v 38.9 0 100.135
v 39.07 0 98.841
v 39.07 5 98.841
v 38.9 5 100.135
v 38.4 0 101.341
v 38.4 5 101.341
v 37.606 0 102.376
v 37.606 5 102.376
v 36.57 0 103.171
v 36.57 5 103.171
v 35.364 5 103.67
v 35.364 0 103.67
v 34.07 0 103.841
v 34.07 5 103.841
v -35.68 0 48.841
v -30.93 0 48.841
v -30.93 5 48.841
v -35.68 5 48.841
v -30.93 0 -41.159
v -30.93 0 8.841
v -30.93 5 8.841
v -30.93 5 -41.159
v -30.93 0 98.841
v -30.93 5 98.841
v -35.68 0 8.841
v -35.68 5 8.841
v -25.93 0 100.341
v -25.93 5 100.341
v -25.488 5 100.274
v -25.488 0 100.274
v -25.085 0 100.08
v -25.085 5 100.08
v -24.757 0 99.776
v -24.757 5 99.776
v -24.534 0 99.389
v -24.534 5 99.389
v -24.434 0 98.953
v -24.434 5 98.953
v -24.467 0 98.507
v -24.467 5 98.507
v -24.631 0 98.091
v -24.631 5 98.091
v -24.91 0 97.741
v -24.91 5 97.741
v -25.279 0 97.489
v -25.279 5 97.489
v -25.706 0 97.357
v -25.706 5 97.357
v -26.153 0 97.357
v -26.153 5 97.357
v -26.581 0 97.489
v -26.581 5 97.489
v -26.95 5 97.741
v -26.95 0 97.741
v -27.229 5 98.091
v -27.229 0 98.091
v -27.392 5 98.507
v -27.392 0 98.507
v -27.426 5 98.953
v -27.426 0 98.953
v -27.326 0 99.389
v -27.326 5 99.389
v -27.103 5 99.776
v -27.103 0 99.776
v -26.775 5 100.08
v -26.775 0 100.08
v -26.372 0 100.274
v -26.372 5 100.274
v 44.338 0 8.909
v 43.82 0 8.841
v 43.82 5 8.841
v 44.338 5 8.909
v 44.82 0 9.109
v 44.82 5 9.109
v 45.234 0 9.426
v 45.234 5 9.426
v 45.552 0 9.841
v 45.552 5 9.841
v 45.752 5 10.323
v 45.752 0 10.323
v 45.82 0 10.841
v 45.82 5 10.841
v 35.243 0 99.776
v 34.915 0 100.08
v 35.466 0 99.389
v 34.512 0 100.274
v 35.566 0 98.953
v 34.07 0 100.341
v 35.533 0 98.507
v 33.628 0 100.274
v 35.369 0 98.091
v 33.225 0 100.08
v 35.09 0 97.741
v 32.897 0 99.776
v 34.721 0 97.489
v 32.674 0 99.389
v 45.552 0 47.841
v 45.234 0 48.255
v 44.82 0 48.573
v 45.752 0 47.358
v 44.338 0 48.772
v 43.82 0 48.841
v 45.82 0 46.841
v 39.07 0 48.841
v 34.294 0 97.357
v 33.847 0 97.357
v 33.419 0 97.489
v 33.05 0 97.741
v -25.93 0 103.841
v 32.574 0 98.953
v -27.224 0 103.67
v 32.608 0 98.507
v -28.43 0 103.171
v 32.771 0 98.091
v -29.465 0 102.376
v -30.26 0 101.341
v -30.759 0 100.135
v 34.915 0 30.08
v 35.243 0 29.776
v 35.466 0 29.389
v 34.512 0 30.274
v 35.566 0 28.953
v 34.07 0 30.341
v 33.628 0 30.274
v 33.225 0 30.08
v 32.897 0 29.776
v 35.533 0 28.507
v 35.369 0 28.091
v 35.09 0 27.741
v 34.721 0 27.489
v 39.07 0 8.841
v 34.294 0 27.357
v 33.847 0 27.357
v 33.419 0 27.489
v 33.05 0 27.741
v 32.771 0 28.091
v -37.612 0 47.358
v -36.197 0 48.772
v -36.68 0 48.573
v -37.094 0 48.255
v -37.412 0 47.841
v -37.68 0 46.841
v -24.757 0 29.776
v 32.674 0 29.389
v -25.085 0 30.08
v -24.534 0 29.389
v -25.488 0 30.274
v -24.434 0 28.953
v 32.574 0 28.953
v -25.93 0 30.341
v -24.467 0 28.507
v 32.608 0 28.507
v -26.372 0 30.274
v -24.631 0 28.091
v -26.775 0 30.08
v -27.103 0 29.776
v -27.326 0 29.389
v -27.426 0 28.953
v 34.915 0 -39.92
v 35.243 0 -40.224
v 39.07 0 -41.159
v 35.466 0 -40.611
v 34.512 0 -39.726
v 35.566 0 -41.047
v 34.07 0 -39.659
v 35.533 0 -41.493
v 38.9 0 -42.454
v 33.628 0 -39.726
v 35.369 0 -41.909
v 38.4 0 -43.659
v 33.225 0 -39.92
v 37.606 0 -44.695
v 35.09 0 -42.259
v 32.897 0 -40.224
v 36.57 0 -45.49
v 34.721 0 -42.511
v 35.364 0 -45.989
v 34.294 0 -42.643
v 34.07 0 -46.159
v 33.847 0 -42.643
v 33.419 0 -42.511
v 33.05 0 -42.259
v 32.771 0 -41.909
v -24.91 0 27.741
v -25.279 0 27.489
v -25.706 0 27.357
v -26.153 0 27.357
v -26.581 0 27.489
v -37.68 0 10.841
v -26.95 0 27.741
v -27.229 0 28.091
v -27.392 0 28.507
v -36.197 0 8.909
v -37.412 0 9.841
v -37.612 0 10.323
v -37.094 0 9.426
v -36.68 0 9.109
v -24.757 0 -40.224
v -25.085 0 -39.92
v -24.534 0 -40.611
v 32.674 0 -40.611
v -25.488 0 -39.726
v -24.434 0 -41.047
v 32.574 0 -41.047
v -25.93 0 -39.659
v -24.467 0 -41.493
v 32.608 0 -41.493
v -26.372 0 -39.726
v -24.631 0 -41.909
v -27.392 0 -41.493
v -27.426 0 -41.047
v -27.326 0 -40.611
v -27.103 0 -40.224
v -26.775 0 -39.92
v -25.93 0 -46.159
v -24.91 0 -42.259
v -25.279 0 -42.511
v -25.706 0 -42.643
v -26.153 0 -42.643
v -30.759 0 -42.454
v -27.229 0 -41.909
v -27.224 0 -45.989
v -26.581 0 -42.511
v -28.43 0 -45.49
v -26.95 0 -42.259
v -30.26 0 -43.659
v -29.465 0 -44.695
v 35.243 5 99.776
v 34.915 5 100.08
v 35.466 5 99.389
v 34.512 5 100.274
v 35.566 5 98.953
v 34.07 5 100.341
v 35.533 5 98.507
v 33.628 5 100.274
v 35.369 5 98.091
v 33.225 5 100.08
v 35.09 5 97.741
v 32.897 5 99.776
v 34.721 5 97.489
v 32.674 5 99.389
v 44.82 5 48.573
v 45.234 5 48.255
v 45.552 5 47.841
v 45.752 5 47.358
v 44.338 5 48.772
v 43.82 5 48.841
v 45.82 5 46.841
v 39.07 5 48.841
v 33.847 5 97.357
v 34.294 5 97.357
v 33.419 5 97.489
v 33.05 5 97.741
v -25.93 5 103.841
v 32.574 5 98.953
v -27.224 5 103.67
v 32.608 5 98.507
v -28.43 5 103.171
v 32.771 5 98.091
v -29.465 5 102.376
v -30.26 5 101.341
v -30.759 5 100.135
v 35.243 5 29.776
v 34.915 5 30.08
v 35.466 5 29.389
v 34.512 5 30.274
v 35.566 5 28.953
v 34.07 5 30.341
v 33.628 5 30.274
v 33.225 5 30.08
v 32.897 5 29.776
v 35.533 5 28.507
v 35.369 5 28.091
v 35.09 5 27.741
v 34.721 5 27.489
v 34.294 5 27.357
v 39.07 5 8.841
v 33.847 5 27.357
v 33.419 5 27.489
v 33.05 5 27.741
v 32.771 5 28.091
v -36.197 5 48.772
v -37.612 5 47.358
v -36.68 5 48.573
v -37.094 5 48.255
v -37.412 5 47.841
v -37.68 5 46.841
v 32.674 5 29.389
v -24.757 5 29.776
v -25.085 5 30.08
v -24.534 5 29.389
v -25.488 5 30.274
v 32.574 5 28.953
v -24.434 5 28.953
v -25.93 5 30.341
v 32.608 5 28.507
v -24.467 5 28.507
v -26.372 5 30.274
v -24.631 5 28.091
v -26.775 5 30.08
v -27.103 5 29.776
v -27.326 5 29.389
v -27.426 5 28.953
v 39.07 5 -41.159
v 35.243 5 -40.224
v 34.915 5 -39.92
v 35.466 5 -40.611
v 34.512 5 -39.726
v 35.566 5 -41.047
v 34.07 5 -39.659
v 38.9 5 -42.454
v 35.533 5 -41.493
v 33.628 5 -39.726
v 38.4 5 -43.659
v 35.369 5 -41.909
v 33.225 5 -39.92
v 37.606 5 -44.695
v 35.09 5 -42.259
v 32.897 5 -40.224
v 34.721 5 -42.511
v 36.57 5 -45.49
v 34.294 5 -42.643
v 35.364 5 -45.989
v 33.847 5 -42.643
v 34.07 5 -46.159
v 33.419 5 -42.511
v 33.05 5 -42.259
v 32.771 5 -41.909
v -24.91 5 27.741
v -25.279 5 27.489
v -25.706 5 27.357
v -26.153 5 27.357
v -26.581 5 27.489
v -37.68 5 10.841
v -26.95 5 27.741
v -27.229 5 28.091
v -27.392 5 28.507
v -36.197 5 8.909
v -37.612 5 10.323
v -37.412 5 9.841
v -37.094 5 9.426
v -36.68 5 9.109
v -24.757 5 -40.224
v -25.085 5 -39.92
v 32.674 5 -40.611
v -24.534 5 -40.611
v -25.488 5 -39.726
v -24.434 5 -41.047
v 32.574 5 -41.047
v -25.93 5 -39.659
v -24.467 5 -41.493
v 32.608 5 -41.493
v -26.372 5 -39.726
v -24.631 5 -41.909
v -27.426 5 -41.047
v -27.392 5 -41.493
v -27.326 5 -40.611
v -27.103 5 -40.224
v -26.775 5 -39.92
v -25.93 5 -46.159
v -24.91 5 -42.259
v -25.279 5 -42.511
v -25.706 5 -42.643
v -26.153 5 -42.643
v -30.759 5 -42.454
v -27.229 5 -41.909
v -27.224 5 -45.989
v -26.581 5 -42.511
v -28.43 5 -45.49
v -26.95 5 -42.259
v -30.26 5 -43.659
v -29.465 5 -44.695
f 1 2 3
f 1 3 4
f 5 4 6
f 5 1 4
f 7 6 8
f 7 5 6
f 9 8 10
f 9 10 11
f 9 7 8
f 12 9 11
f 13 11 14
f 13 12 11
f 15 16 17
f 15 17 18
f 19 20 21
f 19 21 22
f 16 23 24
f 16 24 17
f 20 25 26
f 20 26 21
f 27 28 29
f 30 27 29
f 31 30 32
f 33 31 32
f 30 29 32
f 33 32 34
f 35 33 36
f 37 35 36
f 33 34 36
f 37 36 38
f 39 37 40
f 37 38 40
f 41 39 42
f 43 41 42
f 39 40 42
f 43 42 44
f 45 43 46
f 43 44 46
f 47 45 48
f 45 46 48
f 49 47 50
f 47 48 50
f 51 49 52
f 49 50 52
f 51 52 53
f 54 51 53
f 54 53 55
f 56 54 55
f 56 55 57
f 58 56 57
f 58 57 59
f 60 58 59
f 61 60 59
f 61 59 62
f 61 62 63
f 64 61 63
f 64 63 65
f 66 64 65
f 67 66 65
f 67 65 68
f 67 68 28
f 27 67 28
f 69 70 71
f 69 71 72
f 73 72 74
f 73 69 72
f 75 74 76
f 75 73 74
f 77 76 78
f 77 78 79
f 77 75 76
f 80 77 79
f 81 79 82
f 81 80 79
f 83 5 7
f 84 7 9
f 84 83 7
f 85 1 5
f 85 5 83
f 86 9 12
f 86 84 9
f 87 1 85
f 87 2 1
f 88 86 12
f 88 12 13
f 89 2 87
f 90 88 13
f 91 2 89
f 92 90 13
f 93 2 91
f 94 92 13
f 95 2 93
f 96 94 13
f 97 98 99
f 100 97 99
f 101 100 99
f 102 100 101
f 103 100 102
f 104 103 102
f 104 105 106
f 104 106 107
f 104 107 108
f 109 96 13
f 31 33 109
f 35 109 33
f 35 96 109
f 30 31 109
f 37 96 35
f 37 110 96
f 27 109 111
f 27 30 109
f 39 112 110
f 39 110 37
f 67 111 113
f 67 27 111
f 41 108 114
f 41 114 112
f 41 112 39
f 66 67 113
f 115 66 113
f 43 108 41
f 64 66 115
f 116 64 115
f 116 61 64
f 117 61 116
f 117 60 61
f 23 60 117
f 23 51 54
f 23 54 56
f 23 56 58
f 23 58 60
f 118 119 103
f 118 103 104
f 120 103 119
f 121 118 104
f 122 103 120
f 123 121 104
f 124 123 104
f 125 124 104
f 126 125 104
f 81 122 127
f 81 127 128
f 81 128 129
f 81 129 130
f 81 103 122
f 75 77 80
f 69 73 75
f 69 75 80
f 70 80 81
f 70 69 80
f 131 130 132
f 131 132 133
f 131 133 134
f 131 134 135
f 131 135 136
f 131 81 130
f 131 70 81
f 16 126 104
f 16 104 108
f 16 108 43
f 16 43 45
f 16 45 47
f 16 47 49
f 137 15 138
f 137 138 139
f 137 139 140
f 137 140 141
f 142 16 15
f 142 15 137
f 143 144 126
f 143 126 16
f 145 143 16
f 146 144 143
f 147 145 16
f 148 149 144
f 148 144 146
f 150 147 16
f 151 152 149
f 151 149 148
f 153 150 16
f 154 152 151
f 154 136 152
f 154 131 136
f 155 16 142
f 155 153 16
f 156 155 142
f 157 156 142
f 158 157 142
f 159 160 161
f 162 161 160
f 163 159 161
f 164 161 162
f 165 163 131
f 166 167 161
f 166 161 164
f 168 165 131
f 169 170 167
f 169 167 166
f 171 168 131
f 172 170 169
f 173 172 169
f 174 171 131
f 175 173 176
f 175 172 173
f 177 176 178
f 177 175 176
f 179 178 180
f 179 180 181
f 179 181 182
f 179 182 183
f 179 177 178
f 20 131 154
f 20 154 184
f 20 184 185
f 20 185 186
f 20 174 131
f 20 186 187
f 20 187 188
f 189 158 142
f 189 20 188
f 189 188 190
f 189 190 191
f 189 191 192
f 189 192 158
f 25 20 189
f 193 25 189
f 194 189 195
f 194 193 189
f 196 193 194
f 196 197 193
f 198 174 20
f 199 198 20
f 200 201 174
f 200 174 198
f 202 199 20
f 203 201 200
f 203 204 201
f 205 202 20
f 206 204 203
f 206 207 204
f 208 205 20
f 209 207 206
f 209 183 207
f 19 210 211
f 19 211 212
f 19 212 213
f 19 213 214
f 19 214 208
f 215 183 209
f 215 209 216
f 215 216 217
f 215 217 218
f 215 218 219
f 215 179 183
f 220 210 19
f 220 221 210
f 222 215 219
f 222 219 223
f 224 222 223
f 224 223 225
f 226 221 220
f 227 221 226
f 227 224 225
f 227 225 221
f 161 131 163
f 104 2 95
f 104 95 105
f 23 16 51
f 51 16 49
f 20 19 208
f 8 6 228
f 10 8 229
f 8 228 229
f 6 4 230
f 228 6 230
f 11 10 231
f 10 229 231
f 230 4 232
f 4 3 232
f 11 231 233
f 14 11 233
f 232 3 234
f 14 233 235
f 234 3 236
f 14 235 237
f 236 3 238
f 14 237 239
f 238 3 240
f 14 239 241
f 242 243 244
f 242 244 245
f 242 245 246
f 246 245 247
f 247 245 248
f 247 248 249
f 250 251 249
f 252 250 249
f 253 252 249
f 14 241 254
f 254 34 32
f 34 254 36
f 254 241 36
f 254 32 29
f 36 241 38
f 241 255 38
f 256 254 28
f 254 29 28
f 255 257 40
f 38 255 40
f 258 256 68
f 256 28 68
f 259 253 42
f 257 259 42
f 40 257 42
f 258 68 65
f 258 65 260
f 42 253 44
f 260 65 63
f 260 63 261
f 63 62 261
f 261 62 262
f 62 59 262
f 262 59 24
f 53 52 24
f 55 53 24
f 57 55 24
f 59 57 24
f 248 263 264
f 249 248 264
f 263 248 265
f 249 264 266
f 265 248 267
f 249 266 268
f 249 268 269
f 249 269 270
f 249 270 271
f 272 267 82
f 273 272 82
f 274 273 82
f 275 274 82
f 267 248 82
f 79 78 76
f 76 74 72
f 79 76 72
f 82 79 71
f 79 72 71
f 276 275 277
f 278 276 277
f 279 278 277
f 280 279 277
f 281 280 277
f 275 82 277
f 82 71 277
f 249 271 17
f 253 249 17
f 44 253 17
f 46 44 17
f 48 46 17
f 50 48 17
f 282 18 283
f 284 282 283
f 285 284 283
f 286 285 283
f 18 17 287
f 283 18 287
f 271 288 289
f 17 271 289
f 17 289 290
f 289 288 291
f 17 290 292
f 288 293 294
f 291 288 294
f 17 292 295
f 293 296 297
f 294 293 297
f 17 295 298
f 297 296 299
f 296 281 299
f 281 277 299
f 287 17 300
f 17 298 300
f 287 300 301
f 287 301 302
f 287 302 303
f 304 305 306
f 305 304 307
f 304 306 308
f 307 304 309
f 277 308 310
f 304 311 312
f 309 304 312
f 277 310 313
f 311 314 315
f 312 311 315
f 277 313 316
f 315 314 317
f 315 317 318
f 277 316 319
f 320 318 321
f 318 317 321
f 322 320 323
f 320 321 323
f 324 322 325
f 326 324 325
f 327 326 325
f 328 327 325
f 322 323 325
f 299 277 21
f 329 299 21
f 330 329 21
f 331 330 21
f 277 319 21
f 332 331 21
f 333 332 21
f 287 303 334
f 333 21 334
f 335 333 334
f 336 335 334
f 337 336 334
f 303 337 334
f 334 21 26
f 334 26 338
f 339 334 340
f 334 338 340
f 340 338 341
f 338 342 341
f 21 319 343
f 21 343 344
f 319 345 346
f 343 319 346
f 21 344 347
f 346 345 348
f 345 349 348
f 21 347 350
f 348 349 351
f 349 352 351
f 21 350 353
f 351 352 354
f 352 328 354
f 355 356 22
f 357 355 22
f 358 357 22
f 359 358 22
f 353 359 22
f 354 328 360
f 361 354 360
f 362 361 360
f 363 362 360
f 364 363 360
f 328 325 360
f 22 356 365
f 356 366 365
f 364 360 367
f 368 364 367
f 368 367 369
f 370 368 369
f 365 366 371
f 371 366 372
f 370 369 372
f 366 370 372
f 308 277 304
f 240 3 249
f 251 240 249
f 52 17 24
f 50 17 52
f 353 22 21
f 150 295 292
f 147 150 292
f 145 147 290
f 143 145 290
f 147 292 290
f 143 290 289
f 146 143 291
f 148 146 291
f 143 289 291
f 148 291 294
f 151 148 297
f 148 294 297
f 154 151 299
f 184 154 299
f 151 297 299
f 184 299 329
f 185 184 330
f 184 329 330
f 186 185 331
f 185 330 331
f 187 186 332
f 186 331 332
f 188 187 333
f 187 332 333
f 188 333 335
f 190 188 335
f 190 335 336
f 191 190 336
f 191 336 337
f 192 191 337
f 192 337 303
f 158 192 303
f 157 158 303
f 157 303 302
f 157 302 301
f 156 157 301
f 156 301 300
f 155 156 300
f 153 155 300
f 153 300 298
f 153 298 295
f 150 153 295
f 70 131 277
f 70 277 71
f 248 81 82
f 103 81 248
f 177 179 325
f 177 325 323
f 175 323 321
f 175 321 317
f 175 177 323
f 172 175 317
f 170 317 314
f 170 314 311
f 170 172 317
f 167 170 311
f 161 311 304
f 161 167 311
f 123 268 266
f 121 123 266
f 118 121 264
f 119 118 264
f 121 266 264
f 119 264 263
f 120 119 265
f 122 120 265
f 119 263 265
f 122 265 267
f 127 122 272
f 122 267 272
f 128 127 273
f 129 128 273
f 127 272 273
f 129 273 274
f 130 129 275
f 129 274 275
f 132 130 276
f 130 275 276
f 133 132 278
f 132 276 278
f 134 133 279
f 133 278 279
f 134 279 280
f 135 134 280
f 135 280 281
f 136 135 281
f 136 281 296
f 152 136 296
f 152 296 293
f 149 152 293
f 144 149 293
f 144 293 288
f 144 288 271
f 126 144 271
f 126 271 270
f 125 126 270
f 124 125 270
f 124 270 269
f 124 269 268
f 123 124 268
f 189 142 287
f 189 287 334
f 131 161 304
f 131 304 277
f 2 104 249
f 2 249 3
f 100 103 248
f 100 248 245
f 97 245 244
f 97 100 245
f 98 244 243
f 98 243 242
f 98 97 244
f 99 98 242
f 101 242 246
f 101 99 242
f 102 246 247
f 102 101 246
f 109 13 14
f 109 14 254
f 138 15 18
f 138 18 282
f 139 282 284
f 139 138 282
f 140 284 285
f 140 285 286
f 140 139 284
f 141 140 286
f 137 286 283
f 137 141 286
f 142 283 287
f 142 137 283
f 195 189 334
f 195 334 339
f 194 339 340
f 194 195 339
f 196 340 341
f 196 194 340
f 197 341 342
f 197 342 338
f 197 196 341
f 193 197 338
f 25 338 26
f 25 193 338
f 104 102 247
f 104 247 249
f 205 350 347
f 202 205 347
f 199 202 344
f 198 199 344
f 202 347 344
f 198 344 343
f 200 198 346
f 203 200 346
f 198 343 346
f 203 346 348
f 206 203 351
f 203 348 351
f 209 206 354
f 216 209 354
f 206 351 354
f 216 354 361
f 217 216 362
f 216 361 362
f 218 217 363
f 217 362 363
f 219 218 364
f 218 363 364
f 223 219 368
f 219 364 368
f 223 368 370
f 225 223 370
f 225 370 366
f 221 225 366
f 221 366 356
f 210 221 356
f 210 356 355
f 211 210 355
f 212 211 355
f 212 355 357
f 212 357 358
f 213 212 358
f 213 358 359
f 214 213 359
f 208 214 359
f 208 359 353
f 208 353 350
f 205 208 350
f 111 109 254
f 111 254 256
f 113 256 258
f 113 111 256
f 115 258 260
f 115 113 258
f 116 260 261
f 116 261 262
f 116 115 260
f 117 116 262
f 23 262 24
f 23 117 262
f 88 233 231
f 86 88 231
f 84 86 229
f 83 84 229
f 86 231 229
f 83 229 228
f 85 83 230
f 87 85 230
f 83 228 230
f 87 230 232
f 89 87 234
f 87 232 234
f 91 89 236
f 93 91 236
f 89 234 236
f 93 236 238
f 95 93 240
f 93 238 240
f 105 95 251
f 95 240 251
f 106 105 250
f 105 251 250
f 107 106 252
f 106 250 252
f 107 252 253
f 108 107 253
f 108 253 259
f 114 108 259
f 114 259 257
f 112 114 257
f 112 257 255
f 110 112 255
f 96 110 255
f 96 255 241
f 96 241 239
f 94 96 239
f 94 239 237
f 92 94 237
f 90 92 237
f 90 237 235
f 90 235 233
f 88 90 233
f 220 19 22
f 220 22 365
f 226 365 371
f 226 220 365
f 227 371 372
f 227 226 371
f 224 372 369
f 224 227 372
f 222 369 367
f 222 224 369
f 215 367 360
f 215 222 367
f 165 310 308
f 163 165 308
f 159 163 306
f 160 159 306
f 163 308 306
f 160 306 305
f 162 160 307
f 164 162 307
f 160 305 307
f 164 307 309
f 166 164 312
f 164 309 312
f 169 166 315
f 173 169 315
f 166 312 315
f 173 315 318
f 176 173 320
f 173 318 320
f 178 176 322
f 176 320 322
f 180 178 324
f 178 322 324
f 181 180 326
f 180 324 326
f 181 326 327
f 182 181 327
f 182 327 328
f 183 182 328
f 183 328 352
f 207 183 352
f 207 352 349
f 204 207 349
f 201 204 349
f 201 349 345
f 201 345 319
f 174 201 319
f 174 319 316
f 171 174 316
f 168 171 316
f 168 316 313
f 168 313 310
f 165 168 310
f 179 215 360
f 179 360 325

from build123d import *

# Parameters (mm, degrees)
EXTRUDE_1_DEPTH     = 5
SKETCH_3_R          = 1.5
CUT_EXTRUDE_1_DEPTH = 114.61053585


with BuildPart() as part:
    # 草图1 → 凸台-拉伸1 (new body)
    with BuildSketch(Plane(origin=(0, 0, 0), x_dir=(1, 0, 0), z_dir=(0, 1, 0))):
        with BuildLine():
            Line((-25.929831279, 46.15942029), (34.070168721, 46.15942029))
            ThreePointArc((34.070168721, 46.15942029), (37.605702627, 44.694954196), (39.070168721, 41.15942029))
            Line((39.070168721, 41.15942029), (39.070168721, -8.84057971))
            Line((39.070168721, -8.84057971), (43.820168721, -8.84057971))
            ThreePointArc((43.820168721, -8.84057971), (45.234382283, -9.426366148), (45.820168721, -10.84057971))
            Line((45.820168721, -10.84057971), (45.820168721, -46.84057971))
            ThreePointArc((45.820168721, -46.84057971), (45.234382283, -48.254793273), (43.820168721, -48.84057971))
            Line((43.820168721, -48.84057971), (39.070168721, -48.84057971))
            Line((39.070168721, -48.84057971), (39.070168721, -98.84057971))
            ThreePointArc((39.070168721, -98.84057971), (37.605702627, -102.376113616), (34.070168721, -103.84057971))
            Line((34.070168721, -103.84057971), (-25.929831279, -103.84057971))
            ThreePointArc((-25.929831279, -103.84057971), (-29.465365185, -102.376113616), (-30.929831279, -98.84057971))
            Line((-30.929831279, -98.84057971), (-30.929831279, -48.84057971))
            Line((-30.929831279, -48.84057971), (-35.679831279, -48.84057971))
            ThreePointArc((-35.679831279, -48.84057971), (-37.094044841, -48.254793273), (-37.679831279, -46.84057971))
            Line((-37.679831279, -46.84057971), (-37.679831279, -10.84057971))
            ThreePointArc((-37.679831279, -10.84057971), (-37.094044841, -9.426366148), (-35.679831279, -8.84057971))
            Line((-35.679831279, -8.84057971), (-30.929831279, -8.84057971))
            Line((-30.929831279, -8.84057971), (-30.929831279, 41.15942029))
            ThreePointArc((-30.929831279, 41.15942029), (-29.465365185, 44.694954196), (-25.929831279, 46.15942029))
        make_face()
    extrude(amount=EXTRUDE_1_DEPTH)

    # 草图3 → 切除-拉伸1 (cut, through all)
    with BuildSketch(Plane(origin=(0, 5, 0), x_dir=(1, 0, 0), z_dir=(0, 1, 0))):
        with Locations(Location((34.070168721, 41.15942029, 0), (0, 0, 270))):
            Circle(SKETCH_3_R)
        with Locations(Location((-25.929831279, 41.15942029, 0), (0, 0, 270))):
            Circle(SKETCH_3_R)
        with Locations(Location((-25.929831279, -98.84057971, 0), (0, 0, 270))):
            Circle(SKETCH_3_R)
        with Locations(Location((34.070168721, -98.84057971, 0), (0, 0, 270))):
            Circle(SKETCH_3_R)
        with Locations(Location((34.070168721, -28.84057971, 0), (0, 0, 270))):
            Circle(SKETCH_3_R)
        with Locations(Location((-25.929831279, -28.84057971, 0), (0, 0, 270))):
            Circle(SKETCH_3_R)
    extrude(amount=-CUT_EXTRUDE_1_DEPTH, mode=Mode.SUBTRACT)


solid = part.part
